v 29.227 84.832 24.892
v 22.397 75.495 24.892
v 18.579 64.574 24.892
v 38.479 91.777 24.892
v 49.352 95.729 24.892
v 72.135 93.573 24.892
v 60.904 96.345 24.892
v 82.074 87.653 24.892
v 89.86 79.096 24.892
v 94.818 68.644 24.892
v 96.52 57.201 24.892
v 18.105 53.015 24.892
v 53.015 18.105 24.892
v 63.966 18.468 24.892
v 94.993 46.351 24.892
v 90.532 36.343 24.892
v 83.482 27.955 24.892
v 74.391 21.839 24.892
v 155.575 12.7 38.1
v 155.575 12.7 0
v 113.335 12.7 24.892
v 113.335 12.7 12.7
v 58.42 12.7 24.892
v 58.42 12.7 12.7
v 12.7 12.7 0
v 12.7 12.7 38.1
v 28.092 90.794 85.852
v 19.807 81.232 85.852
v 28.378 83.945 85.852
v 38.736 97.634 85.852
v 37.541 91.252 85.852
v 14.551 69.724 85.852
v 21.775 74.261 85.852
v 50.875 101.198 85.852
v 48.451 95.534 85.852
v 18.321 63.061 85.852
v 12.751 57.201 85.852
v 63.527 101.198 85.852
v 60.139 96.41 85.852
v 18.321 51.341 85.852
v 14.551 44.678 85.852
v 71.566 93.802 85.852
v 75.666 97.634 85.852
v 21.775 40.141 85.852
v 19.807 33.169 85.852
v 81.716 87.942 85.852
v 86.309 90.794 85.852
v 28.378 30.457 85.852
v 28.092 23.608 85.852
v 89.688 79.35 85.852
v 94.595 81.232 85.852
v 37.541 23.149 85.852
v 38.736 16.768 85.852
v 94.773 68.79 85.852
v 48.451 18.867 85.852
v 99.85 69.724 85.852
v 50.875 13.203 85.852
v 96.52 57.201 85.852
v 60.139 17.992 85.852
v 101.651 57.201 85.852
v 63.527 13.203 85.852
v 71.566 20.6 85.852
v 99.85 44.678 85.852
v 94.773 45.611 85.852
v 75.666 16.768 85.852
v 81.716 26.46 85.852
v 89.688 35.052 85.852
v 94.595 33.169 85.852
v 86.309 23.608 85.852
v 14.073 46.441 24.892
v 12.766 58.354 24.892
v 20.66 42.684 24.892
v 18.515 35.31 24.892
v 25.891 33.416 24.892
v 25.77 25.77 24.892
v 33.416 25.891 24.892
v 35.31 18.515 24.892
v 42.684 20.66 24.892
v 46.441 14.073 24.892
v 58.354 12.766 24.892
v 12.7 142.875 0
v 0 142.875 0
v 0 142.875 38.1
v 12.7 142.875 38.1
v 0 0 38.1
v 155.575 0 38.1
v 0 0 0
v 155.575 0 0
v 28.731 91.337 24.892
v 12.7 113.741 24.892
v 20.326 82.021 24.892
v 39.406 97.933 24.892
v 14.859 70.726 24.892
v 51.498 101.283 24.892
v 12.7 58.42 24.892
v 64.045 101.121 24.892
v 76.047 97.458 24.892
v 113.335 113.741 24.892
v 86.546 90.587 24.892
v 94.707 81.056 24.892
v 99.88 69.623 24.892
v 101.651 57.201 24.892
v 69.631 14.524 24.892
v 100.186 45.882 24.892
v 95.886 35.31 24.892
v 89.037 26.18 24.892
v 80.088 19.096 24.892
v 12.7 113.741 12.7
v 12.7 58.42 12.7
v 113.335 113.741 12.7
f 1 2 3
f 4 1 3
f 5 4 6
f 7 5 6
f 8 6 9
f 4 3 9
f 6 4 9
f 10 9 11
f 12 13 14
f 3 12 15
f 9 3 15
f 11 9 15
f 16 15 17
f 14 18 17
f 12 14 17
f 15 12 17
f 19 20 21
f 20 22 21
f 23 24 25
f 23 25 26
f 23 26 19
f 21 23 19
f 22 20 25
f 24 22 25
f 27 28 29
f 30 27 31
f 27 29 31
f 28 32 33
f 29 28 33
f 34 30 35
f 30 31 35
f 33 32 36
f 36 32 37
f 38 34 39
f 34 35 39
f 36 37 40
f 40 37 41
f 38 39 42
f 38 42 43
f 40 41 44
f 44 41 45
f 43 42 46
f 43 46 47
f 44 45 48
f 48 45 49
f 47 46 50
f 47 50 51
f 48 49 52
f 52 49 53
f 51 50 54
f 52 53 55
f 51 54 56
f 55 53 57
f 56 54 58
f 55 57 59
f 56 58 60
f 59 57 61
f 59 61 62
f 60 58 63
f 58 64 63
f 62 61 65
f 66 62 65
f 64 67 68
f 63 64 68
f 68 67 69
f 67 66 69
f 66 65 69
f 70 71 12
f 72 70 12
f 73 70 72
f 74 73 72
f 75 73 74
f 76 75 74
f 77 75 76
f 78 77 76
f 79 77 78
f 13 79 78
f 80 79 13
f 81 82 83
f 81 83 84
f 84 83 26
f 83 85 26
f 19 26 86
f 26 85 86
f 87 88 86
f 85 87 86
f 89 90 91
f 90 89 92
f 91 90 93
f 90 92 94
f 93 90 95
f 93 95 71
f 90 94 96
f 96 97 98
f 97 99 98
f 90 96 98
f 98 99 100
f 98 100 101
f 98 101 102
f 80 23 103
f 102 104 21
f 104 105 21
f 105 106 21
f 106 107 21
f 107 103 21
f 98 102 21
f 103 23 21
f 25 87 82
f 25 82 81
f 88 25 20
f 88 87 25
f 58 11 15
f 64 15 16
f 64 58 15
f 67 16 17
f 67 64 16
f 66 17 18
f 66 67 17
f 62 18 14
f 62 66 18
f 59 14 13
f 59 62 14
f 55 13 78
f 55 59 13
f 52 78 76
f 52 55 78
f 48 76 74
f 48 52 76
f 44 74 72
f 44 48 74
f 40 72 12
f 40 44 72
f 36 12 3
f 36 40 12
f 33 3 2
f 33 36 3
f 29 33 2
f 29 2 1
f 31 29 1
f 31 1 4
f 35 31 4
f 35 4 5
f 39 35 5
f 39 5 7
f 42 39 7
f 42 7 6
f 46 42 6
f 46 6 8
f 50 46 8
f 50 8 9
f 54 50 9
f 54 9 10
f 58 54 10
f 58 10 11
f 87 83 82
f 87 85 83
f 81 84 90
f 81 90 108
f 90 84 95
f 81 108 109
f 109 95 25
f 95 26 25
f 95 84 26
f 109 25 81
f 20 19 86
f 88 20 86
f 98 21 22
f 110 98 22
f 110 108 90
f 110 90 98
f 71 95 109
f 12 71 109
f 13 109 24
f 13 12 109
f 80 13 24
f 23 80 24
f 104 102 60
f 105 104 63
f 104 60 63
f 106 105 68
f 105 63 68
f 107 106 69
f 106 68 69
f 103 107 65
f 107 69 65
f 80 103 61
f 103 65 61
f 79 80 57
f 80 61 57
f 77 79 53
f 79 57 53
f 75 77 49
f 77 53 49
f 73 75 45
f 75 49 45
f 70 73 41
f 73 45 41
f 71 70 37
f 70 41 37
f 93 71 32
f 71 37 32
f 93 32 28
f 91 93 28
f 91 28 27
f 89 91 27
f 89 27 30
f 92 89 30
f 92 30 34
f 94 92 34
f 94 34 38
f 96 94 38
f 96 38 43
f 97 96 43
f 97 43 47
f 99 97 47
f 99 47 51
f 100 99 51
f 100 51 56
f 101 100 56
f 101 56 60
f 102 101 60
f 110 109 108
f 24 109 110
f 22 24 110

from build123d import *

# Parameters (mm, degrees)
SKETCH1_W           = 12.7
SKETCH1_H           = 38.1
BOSS_EXTRUDE1_DEPTH = 155.575
SKETCH3_W           = 12.7
SKETCH3_H           = 38.1
BOSS_EXTRUDE2_DEPTH = 130.175
SKETCH4_W           = 100.6348
SKETCH4_H           = 12.192
BOSS_EXTRUDE3_DEPTH = 101.0412
CUT_EXTRUDE2_DEPTH  = 12.192
BOSS_EXTRUDE8_START = -60.96
SKETCH6_R           = 44.45
SKETCH6_R_2         = 39.3192
BOSS_EXTRUDE8_DEPTH = 60.96


with BuildPart() as part:
    # Sketch1 → Boss-Extrude1 (new body)
    with BuildSketch(Plane(origin=(0, 0, 0), x_dir=(0, -1, 0), z_dir=(-1, 0, 0))):
        with Locations((-6.35, 19.05)):
            Rectangle(SKETCH1_W, SKETCH1_H)
    extrude(amount=-BOSS_EXTRUDE1_DEPTH)

    # Sketch3 → Boss-Extrude2 (add)
    with BuildSketch(Plane(origin=(0, 12.7, 0), x_dir=(1, 0, 0), z_dir=(0, 1, 0))):
        with Locations((6.35, -19.05)):
            Rectangle(SKETCH3_W, SKETCH3_H)
    extrude(amount=BOSS_EXTRUDE2_DEPTH)

    # Sketch4 → Boss-Extrude3 (add)
    with BuildSketch(Plane(origin=(0, 12.7, 0), x_dir=(1, 0, 0), z_dir=(0, 1, 0))):
        with Locations((63.0174, -18.796)):
            Rectangle(SKETCH4_W, SKETCH4_H)
    extrude(amount=BOSS_EXTRUDE3_DEPTH)

    # Sketch5 → Cut-Extrude2 (cut)
    with BuildSketch(Plane.XY.offset(24.892)):
        Polygon((12.7, 58.42), (58.42, 12.7), (12.7, 12.7), align=None)
    extrude(amount=-CUT_EXTRUDE2_DEPTH, mode=Mode.SUBTRACT)

    # Sketch6 → Boss-Extrude8 (add)
    with BuildSketch(Plane(origin=(0, 0, 24.892), x_dir=(-1, 0, 0), z_dir=(0, 0, -1)).offset(BOSS_EXTRUDE8_START)):
        with Locations(Location((-57.2008, 57.2008, 0), (0, 0, 180))):
            Circle(SKETCH6_R)
        with Locations(Location((-57.2008, 57.2008, 0), (0, 0, 180))):
            Circle(SKETCH6_R_2, mode=Mode.SUBTRACT)
    extrude(amount=BOSS_EXTRUDE8_DEPTH)


solid = part.part
